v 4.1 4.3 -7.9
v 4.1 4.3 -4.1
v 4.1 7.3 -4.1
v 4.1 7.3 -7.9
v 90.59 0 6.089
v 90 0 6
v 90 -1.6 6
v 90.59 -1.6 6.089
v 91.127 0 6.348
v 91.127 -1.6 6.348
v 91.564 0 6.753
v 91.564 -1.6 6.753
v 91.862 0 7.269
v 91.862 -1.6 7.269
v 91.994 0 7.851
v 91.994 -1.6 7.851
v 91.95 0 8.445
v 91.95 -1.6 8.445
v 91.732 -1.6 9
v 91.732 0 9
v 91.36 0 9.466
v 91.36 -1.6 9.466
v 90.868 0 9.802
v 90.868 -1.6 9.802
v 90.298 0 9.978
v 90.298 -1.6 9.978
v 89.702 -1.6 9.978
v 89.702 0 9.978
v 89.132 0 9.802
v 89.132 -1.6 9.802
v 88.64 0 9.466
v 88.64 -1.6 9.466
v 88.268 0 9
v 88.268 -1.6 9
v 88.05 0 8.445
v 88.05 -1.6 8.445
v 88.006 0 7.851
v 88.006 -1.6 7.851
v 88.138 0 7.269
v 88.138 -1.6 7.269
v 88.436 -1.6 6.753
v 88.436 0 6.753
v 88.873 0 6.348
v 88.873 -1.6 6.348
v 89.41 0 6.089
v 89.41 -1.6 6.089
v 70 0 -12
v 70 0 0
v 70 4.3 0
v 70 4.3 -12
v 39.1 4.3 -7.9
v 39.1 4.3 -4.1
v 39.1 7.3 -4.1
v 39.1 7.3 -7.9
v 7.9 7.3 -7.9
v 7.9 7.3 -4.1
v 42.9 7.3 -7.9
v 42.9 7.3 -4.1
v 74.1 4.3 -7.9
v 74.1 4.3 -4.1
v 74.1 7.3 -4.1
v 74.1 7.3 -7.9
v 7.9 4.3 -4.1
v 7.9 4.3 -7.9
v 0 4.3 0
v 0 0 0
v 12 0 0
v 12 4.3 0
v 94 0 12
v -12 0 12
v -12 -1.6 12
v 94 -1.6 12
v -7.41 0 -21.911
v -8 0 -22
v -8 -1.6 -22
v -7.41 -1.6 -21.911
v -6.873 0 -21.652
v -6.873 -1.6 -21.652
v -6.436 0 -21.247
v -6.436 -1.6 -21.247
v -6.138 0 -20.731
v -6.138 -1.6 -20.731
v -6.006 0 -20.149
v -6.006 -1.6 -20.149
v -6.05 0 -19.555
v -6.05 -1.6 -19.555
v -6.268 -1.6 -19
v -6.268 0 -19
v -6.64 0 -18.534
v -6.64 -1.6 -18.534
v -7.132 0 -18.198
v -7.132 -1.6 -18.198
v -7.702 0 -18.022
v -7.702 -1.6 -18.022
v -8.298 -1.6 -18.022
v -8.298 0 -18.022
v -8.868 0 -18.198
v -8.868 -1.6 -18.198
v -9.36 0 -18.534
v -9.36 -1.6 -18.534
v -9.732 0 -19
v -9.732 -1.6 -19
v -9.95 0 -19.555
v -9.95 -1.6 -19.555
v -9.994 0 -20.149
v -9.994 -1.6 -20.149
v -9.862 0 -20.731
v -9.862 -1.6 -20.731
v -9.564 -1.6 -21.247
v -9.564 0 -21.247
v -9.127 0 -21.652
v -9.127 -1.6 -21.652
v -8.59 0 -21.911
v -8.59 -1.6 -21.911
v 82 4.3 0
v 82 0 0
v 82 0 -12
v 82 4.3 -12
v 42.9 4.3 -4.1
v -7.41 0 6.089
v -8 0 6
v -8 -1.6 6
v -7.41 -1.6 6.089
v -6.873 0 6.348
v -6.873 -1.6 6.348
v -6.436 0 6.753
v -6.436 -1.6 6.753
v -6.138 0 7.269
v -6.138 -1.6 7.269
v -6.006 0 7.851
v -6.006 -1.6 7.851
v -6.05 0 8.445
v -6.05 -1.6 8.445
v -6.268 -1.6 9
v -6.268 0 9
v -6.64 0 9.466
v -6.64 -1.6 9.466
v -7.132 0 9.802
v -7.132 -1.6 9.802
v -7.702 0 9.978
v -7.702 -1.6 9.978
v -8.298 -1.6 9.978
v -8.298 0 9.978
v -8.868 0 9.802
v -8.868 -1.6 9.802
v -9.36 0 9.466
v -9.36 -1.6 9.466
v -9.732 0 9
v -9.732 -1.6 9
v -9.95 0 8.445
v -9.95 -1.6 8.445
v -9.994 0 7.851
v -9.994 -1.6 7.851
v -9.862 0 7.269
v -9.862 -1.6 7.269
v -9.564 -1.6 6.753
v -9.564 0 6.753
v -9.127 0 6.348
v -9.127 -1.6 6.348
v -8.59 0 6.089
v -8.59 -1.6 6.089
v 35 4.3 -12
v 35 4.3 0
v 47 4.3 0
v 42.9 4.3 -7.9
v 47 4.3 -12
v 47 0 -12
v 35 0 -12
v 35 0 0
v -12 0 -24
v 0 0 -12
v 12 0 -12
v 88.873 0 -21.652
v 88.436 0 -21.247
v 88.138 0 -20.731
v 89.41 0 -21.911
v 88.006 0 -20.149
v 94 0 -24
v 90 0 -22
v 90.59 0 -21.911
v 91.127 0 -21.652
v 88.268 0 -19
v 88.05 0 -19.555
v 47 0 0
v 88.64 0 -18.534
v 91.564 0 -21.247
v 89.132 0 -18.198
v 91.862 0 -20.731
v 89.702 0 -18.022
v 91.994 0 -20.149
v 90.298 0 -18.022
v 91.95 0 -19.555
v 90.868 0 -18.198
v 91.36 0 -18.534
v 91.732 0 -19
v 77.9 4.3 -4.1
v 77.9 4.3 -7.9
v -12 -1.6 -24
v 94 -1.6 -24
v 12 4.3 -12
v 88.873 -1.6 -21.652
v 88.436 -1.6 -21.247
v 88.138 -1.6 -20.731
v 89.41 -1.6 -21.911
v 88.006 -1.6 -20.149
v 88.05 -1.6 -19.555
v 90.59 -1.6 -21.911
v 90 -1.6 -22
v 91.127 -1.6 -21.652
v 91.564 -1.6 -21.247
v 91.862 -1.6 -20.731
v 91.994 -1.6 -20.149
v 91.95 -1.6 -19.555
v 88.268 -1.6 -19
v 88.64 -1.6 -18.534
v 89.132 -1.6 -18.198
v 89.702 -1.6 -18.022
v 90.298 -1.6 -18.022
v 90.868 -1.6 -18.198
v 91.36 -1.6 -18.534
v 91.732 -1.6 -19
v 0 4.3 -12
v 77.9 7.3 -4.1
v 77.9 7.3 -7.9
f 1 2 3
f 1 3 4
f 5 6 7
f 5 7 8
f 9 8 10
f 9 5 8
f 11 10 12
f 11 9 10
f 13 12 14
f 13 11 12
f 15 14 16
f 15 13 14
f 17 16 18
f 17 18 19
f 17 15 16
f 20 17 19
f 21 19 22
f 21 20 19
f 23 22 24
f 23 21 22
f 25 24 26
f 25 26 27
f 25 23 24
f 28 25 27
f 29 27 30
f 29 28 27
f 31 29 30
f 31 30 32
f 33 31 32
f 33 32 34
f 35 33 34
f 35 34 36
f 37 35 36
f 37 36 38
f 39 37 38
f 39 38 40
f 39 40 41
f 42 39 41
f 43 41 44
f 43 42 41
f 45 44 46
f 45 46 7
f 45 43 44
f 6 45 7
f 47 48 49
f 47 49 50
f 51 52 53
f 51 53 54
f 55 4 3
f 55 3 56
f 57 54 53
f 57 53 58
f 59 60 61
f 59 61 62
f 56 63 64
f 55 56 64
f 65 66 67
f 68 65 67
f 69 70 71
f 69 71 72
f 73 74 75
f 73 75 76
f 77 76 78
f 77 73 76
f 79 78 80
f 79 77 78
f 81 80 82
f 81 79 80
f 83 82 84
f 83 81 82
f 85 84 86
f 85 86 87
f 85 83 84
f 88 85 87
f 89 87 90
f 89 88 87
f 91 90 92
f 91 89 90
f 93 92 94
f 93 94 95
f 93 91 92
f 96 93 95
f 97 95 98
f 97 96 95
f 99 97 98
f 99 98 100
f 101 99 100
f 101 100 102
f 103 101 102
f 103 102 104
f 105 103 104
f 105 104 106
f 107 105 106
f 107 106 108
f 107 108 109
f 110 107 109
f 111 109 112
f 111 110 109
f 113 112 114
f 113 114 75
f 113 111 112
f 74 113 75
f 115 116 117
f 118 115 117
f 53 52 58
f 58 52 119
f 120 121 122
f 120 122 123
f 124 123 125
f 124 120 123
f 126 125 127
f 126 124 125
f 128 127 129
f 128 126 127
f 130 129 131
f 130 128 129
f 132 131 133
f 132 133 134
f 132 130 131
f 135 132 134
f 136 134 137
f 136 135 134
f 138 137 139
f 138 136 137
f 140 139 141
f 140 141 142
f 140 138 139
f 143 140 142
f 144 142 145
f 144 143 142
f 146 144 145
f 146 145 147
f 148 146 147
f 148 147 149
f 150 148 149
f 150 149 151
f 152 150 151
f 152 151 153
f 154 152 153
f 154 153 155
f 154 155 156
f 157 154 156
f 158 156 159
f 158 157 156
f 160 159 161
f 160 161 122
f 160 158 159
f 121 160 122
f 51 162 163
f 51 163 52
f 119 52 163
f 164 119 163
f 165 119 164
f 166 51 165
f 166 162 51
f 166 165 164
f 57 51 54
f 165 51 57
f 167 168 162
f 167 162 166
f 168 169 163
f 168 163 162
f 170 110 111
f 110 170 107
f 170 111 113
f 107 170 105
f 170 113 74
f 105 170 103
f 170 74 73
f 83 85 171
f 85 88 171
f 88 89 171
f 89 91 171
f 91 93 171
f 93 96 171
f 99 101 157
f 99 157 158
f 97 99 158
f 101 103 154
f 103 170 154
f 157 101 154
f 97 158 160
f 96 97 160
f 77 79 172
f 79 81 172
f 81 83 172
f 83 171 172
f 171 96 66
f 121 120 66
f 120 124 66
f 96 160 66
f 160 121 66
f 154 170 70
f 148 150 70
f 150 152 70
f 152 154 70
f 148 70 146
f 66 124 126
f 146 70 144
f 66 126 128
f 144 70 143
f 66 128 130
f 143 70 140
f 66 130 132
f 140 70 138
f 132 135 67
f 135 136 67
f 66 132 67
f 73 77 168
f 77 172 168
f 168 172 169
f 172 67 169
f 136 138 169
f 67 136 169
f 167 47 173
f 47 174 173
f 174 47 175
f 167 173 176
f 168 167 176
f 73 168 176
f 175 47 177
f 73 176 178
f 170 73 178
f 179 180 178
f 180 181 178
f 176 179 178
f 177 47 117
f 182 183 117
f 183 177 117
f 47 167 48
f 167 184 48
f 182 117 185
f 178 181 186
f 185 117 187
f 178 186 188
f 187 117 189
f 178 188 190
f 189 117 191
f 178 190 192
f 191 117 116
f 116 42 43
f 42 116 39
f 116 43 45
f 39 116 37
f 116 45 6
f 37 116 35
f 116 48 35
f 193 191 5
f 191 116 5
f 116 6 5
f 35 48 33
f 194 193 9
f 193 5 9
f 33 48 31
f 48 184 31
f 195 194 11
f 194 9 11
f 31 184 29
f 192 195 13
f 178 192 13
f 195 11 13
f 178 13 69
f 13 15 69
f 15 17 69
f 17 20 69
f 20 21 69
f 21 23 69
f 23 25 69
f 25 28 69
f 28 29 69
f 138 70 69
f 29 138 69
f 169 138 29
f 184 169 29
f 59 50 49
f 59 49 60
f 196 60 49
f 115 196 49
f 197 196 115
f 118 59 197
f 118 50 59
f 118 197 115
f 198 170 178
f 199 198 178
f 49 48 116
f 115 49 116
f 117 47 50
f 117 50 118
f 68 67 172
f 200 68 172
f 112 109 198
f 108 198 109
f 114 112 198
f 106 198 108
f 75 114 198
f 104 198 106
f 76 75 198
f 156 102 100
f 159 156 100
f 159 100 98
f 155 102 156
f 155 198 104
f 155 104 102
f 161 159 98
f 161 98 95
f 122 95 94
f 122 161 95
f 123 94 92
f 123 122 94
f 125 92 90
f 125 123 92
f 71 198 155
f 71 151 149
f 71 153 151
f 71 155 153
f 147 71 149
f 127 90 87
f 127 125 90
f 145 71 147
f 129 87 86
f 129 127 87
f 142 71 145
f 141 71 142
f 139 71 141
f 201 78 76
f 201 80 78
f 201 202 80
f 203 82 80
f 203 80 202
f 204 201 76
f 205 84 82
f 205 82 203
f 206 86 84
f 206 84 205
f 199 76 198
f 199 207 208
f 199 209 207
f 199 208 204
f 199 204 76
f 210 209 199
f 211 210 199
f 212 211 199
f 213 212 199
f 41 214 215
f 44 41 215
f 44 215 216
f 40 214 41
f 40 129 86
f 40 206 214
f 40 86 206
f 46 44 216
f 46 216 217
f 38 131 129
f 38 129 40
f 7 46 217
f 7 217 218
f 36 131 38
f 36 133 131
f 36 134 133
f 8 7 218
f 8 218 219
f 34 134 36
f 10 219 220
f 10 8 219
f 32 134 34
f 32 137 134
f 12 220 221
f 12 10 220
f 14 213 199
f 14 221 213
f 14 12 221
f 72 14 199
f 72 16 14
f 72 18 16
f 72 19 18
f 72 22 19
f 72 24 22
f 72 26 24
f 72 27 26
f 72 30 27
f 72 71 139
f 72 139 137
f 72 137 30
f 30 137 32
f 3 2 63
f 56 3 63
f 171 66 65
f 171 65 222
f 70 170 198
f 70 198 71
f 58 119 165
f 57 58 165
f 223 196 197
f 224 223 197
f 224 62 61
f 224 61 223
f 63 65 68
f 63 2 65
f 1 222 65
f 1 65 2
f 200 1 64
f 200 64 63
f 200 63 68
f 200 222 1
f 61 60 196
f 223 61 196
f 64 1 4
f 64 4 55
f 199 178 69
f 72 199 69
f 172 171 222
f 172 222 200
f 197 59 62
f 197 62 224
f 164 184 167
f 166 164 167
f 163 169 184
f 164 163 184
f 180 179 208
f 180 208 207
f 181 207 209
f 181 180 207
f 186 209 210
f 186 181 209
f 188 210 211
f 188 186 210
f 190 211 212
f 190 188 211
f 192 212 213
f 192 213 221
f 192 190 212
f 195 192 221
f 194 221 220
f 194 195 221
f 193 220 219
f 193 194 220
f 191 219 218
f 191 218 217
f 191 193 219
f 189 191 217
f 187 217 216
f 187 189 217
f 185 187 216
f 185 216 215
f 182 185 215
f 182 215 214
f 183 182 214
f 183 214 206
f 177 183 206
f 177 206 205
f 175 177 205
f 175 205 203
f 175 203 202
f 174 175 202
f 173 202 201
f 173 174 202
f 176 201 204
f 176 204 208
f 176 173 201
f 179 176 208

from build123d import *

# Parameters (mm, degrees)
SKETCH1_W           = 12
SKETCH1_H           = 12
BOSS_EXTRUDE1_DEPTH = 4.3
SKETCH2_W           = 3.8
SKETCH2_H           = 3.8
BOSS_EXTRUDE2_DEPTH = 3
SKETCH3_W           = 106
SKETCH3_H           = 36
SKETCH3_R           = 2
BOSS_EXTRUDE3_DEPTH = 1.6
SKETCH4_W           = 12
SKETCH4_H           = 12
BOSS_EXTRUDE4_DEPTH = 4.3
SKETCH5_W           = 3.8
SKETCH5_H           = 3.8
BOSS_EXTRUDE5_DEPTH = 3


with BuildPart() as part:
    # Sketch1 → Boss-Extrude1 (new body)
    with BuildSketch(Plane(origin=(0, 0, 0), x_dir=(1, 0, 0), z_dir=(0, 1, 0))):
        with Locations((6, 6)):
            Rectangle(SKETCH1_W, SKETCH1_H)
    extrude(amount=BOSS_EXTRUDE1_DEPTH)

    # Sketch2 → Boss-Extrude2 (add)
    with BuildSketch(Plane(origin=(0, 4.3, 0), x_dir=(1, 0, 0), z_dir=(0, 1, 0))):
        with Locations((6, 6)):
            Rectangle(SKETCH2_W, SKETCH2_H)
    extrude(amount=BOSS_EXTRUDE2_DEPTH)

    # Sketch3 → Boss-Extrude3 (add)
    with BuildSketch(Plane.XZ):
        with Locations((41, -6)):
            Rectangle(SKETCH3_W, SKETCH3_H)
        with Locations(Location((-8, -20, 0), (0, 0, 270))):
            Circle(SKETCH3_R, mode=Mode.SUBTRACT)
        with Locations(Location((-8, 8, 0), (0, 0, 270))):
            Circle(SKETCH3_R, mode=Mode.SUBTRACT)
        with Locations(Location((90, 8, 0), (0, 0, 270))):
            Circle(SKETCH3_R, mode=Mode.SUBTRACT)
        with Locations(Location((90, -20, 0), (0, 0, 270))):
            Circle(SKETCH3_R, mode=Mode.SUBTRACT)
    extrude(amount=BOSS_EXTRUDE3_DEPTH)

    # Sketch4 → Boss-Extrude4 (add)
    with BuildSketch(Plane(origin=(0, 0, 0), x_dir=(1, 0, 0), z_dir=(0, 1, 0))):
        with Locations((41, 6)):
            Rectangle(SKETCH4_W, SKETCH4_H)
        with Locations((76, 6)):
            Rectangle(SKETCH4_W, SKETCH4_H)
    extrude(amount=BOSS_EXTRUDE4_DEPTH)

    # Sketch5 → Boss-Extrude5 (add)
    with BuildSketch(Plane(origin=(0, 4.3, 0), x_dir=(1, 0, 0), z_dir=(0, 1, 0))):
        with Locations((41, 6)):
            Rectangle(SKETCH5_W, SKETCH5_H)
        with Locations((76, 6)):
            Rectangle(SKETCH5_W, SKETCH5_H)
    extrude(amount=BOSS_EXTRUDE5_DEPTH)


solid = part.part
